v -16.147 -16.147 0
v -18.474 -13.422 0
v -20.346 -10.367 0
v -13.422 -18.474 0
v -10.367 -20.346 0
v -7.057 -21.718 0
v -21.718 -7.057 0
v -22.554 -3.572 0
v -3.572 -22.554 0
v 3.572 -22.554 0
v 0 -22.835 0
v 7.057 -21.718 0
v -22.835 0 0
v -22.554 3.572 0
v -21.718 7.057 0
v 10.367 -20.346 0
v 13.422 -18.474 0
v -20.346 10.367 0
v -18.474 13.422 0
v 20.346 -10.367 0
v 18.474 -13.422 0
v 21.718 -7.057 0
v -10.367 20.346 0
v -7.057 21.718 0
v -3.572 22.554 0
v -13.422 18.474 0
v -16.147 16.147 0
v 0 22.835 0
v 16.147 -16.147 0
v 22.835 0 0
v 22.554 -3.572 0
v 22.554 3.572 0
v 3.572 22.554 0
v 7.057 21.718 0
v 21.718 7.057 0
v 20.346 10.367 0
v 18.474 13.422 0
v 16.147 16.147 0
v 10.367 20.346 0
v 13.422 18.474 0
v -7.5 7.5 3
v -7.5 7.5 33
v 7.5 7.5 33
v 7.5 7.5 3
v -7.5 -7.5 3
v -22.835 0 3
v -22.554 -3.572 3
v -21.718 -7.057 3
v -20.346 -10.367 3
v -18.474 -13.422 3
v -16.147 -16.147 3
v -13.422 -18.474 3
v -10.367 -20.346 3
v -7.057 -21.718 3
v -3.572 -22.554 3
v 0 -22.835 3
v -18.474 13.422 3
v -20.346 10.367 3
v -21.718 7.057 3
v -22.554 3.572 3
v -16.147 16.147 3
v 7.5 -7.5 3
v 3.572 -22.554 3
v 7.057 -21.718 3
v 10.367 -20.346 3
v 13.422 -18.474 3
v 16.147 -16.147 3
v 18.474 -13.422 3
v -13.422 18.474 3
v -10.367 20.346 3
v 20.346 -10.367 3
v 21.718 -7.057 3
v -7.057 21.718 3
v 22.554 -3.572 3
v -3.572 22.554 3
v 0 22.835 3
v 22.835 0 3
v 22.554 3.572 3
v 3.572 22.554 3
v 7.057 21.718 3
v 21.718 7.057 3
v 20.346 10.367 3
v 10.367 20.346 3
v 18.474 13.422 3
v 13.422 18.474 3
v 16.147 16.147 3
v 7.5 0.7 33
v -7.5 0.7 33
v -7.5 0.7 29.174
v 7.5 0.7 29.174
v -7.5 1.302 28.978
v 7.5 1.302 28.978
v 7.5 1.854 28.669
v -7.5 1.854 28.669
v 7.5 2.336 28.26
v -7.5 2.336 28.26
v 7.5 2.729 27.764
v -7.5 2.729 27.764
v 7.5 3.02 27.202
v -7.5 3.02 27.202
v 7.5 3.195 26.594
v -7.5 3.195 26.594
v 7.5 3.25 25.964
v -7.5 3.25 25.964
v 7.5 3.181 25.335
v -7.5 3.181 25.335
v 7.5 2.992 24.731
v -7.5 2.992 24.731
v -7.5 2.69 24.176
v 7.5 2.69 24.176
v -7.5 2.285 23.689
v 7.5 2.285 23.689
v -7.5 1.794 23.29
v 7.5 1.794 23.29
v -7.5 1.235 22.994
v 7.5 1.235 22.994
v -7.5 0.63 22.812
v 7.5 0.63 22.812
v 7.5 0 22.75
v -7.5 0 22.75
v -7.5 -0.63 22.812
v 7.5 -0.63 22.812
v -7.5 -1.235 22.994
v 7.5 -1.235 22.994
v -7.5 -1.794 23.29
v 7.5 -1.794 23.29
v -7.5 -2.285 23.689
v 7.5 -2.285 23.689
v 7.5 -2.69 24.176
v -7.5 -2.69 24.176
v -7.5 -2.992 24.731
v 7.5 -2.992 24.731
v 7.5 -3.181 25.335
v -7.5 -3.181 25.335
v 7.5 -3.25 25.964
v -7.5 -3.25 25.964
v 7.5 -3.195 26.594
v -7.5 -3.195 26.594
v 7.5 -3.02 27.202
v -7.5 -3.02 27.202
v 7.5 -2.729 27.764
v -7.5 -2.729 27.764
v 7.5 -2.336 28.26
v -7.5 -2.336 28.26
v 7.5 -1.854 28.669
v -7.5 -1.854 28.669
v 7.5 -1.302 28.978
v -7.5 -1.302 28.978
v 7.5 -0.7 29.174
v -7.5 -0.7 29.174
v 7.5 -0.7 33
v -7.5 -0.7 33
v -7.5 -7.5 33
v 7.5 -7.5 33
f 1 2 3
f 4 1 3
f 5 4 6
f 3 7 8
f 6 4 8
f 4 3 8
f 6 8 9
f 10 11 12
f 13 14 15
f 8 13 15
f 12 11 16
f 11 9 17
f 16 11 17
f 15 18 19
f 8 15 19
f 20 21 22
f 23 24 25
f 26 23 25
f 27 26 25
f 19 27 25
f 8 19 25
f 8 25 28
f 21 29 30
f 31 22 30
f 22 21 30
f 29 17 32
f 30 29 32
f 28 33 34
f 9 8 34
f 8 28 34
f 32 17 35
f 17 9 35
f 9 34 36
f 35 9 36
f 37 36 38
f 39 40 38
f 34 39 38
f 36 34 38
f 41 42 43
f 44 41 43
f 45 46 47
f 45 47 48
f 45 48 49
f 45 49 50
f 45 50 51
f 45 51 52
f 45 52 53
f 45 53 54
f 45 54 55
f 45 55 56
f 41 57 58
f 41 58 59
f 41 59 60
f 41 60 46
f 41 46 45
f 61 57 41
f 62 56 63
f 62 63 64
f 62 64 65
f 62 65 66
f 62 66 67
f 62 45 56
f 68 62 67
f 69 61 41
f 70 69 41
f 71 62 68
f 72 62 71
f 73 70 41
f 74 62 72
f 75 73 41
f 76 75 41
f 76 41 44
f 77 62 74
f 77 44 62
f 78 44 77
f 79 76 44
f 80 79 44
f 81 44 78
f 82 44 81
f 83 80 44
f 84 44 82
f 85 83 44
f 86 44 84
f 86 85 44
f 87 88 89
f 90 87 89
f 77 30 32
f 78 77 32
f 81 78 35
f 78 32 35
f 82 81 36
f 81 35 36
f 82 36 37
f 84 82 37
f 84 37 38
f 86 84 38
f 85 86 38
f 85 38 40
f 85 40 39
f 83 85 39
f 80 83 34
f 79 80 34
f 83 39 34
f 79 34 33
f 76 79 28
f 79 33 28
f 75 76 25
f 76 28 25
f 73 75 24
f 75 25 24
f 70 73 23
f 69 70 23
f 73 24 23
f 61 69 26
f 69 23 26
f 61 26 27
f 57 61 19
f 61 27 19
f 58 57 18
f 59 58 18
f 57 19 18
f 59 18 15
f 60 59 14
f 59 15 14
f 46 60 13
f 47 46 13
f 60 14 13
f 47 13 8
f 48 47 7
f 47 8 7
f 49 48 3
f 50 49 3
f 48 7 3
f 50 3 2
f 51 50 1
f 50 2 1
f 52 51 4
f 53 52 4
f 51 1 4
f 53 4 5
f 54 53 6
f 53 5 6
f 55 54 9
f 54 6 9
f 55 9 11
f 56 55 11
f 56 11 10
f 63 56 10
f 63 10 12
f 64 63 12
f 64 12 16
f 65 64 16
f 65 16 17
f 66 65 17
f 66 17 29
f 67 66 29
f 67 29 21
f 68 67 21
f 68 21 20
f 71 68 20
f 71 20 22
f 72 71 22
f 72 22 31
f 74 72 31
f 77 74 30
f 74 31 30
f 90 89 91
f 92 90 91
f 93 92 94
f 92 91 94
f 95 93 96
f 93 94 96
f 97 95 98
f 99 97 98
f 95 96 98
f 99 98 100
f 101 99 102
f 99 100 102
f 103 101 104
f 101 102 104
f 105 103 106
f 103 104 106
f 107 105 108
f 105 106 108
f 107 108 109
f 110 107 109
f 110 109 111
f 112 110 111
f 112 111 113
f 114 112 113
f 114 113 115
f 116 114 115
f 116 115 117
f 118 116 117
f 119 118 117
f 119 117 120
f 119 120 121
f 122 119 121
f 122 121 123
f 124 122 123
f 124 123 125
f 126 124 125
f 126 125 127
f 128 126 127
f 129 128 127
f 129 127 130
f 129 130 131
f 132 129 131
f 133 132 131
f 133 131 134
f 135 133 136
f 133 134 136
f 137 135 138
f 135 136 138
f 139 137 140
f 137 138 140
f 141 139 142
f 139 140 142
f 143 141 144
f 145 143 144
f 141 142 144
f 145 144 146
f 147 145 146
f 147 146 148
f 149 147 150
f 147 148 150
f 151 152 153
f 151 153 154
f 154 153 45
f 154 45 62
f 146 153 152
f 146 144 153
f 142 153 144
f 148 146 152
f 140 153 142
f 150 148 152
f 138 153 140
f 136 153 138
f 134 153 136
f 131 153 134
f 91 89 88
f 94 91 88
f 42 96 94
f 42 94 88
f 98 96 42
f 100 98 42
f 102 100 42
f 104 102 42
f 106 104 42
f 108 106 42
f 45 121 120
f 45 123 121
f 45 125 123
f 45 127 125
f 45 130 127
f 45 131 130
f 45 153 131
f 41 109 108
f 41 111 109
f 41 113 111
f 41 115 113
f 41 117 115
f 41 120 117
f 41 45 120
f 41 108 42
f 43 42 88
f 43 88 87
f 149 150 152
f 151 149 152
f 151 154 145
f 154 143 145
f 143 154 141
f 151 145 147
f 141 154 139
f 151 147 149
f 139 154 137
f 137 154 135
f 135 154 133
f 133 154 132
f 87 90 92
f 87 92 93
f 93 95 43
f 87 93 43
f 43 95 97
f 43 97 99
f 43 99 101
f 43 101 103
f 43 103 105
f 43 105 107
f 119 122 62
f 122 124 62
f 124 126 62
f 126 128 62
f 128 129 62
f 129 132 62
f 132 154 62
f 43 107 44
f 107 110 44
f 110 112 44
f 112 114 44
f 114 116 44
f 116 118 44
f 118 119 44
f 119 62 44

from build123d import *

# Parameters (mm, degrees)
F0_R     = 22.8354
F1_DEPTH = 3
F2_W     = 15
F2_H     = 15
F3_DEPTH = 30
F5_DEPTH = 25


with BuildPart() as f1:
    # F0 (on Top) → F1 (new body)
    with BuildSketch(Plane.XY):
        Circle(F0_R)
    extrude(amount=F1_DEPTH)

    # F2 (on face) → F3 (join)
    with BuildSketch(Plane.XY.offset(3)):
        Rectangle(F2_W, F2_H)
    extrude(amount=F3_DEPTH)

    # F4 (on face) → F5 (cut)
    with BuildSketch(Plane(origin=(-7.5, 0, 0), x_dir=(0, -1, 0), z_dir=(-1, 0, 0))):
        with BuildLine():
            Line((-0.7, 33), (-0.7, 29.17372))
            ThreePointArc((-0.7, 29.17372), (0, 22.75), (0.7, 29.17372))
            Line((0.7, 29.17372), (0.7, 33))
            Line((0.7, 33), (-0.7, 33))
        make_face()
    extrude(amount=-F5_DEPTH, mode=Mode.SUBTRACT)


solid = f1.part
